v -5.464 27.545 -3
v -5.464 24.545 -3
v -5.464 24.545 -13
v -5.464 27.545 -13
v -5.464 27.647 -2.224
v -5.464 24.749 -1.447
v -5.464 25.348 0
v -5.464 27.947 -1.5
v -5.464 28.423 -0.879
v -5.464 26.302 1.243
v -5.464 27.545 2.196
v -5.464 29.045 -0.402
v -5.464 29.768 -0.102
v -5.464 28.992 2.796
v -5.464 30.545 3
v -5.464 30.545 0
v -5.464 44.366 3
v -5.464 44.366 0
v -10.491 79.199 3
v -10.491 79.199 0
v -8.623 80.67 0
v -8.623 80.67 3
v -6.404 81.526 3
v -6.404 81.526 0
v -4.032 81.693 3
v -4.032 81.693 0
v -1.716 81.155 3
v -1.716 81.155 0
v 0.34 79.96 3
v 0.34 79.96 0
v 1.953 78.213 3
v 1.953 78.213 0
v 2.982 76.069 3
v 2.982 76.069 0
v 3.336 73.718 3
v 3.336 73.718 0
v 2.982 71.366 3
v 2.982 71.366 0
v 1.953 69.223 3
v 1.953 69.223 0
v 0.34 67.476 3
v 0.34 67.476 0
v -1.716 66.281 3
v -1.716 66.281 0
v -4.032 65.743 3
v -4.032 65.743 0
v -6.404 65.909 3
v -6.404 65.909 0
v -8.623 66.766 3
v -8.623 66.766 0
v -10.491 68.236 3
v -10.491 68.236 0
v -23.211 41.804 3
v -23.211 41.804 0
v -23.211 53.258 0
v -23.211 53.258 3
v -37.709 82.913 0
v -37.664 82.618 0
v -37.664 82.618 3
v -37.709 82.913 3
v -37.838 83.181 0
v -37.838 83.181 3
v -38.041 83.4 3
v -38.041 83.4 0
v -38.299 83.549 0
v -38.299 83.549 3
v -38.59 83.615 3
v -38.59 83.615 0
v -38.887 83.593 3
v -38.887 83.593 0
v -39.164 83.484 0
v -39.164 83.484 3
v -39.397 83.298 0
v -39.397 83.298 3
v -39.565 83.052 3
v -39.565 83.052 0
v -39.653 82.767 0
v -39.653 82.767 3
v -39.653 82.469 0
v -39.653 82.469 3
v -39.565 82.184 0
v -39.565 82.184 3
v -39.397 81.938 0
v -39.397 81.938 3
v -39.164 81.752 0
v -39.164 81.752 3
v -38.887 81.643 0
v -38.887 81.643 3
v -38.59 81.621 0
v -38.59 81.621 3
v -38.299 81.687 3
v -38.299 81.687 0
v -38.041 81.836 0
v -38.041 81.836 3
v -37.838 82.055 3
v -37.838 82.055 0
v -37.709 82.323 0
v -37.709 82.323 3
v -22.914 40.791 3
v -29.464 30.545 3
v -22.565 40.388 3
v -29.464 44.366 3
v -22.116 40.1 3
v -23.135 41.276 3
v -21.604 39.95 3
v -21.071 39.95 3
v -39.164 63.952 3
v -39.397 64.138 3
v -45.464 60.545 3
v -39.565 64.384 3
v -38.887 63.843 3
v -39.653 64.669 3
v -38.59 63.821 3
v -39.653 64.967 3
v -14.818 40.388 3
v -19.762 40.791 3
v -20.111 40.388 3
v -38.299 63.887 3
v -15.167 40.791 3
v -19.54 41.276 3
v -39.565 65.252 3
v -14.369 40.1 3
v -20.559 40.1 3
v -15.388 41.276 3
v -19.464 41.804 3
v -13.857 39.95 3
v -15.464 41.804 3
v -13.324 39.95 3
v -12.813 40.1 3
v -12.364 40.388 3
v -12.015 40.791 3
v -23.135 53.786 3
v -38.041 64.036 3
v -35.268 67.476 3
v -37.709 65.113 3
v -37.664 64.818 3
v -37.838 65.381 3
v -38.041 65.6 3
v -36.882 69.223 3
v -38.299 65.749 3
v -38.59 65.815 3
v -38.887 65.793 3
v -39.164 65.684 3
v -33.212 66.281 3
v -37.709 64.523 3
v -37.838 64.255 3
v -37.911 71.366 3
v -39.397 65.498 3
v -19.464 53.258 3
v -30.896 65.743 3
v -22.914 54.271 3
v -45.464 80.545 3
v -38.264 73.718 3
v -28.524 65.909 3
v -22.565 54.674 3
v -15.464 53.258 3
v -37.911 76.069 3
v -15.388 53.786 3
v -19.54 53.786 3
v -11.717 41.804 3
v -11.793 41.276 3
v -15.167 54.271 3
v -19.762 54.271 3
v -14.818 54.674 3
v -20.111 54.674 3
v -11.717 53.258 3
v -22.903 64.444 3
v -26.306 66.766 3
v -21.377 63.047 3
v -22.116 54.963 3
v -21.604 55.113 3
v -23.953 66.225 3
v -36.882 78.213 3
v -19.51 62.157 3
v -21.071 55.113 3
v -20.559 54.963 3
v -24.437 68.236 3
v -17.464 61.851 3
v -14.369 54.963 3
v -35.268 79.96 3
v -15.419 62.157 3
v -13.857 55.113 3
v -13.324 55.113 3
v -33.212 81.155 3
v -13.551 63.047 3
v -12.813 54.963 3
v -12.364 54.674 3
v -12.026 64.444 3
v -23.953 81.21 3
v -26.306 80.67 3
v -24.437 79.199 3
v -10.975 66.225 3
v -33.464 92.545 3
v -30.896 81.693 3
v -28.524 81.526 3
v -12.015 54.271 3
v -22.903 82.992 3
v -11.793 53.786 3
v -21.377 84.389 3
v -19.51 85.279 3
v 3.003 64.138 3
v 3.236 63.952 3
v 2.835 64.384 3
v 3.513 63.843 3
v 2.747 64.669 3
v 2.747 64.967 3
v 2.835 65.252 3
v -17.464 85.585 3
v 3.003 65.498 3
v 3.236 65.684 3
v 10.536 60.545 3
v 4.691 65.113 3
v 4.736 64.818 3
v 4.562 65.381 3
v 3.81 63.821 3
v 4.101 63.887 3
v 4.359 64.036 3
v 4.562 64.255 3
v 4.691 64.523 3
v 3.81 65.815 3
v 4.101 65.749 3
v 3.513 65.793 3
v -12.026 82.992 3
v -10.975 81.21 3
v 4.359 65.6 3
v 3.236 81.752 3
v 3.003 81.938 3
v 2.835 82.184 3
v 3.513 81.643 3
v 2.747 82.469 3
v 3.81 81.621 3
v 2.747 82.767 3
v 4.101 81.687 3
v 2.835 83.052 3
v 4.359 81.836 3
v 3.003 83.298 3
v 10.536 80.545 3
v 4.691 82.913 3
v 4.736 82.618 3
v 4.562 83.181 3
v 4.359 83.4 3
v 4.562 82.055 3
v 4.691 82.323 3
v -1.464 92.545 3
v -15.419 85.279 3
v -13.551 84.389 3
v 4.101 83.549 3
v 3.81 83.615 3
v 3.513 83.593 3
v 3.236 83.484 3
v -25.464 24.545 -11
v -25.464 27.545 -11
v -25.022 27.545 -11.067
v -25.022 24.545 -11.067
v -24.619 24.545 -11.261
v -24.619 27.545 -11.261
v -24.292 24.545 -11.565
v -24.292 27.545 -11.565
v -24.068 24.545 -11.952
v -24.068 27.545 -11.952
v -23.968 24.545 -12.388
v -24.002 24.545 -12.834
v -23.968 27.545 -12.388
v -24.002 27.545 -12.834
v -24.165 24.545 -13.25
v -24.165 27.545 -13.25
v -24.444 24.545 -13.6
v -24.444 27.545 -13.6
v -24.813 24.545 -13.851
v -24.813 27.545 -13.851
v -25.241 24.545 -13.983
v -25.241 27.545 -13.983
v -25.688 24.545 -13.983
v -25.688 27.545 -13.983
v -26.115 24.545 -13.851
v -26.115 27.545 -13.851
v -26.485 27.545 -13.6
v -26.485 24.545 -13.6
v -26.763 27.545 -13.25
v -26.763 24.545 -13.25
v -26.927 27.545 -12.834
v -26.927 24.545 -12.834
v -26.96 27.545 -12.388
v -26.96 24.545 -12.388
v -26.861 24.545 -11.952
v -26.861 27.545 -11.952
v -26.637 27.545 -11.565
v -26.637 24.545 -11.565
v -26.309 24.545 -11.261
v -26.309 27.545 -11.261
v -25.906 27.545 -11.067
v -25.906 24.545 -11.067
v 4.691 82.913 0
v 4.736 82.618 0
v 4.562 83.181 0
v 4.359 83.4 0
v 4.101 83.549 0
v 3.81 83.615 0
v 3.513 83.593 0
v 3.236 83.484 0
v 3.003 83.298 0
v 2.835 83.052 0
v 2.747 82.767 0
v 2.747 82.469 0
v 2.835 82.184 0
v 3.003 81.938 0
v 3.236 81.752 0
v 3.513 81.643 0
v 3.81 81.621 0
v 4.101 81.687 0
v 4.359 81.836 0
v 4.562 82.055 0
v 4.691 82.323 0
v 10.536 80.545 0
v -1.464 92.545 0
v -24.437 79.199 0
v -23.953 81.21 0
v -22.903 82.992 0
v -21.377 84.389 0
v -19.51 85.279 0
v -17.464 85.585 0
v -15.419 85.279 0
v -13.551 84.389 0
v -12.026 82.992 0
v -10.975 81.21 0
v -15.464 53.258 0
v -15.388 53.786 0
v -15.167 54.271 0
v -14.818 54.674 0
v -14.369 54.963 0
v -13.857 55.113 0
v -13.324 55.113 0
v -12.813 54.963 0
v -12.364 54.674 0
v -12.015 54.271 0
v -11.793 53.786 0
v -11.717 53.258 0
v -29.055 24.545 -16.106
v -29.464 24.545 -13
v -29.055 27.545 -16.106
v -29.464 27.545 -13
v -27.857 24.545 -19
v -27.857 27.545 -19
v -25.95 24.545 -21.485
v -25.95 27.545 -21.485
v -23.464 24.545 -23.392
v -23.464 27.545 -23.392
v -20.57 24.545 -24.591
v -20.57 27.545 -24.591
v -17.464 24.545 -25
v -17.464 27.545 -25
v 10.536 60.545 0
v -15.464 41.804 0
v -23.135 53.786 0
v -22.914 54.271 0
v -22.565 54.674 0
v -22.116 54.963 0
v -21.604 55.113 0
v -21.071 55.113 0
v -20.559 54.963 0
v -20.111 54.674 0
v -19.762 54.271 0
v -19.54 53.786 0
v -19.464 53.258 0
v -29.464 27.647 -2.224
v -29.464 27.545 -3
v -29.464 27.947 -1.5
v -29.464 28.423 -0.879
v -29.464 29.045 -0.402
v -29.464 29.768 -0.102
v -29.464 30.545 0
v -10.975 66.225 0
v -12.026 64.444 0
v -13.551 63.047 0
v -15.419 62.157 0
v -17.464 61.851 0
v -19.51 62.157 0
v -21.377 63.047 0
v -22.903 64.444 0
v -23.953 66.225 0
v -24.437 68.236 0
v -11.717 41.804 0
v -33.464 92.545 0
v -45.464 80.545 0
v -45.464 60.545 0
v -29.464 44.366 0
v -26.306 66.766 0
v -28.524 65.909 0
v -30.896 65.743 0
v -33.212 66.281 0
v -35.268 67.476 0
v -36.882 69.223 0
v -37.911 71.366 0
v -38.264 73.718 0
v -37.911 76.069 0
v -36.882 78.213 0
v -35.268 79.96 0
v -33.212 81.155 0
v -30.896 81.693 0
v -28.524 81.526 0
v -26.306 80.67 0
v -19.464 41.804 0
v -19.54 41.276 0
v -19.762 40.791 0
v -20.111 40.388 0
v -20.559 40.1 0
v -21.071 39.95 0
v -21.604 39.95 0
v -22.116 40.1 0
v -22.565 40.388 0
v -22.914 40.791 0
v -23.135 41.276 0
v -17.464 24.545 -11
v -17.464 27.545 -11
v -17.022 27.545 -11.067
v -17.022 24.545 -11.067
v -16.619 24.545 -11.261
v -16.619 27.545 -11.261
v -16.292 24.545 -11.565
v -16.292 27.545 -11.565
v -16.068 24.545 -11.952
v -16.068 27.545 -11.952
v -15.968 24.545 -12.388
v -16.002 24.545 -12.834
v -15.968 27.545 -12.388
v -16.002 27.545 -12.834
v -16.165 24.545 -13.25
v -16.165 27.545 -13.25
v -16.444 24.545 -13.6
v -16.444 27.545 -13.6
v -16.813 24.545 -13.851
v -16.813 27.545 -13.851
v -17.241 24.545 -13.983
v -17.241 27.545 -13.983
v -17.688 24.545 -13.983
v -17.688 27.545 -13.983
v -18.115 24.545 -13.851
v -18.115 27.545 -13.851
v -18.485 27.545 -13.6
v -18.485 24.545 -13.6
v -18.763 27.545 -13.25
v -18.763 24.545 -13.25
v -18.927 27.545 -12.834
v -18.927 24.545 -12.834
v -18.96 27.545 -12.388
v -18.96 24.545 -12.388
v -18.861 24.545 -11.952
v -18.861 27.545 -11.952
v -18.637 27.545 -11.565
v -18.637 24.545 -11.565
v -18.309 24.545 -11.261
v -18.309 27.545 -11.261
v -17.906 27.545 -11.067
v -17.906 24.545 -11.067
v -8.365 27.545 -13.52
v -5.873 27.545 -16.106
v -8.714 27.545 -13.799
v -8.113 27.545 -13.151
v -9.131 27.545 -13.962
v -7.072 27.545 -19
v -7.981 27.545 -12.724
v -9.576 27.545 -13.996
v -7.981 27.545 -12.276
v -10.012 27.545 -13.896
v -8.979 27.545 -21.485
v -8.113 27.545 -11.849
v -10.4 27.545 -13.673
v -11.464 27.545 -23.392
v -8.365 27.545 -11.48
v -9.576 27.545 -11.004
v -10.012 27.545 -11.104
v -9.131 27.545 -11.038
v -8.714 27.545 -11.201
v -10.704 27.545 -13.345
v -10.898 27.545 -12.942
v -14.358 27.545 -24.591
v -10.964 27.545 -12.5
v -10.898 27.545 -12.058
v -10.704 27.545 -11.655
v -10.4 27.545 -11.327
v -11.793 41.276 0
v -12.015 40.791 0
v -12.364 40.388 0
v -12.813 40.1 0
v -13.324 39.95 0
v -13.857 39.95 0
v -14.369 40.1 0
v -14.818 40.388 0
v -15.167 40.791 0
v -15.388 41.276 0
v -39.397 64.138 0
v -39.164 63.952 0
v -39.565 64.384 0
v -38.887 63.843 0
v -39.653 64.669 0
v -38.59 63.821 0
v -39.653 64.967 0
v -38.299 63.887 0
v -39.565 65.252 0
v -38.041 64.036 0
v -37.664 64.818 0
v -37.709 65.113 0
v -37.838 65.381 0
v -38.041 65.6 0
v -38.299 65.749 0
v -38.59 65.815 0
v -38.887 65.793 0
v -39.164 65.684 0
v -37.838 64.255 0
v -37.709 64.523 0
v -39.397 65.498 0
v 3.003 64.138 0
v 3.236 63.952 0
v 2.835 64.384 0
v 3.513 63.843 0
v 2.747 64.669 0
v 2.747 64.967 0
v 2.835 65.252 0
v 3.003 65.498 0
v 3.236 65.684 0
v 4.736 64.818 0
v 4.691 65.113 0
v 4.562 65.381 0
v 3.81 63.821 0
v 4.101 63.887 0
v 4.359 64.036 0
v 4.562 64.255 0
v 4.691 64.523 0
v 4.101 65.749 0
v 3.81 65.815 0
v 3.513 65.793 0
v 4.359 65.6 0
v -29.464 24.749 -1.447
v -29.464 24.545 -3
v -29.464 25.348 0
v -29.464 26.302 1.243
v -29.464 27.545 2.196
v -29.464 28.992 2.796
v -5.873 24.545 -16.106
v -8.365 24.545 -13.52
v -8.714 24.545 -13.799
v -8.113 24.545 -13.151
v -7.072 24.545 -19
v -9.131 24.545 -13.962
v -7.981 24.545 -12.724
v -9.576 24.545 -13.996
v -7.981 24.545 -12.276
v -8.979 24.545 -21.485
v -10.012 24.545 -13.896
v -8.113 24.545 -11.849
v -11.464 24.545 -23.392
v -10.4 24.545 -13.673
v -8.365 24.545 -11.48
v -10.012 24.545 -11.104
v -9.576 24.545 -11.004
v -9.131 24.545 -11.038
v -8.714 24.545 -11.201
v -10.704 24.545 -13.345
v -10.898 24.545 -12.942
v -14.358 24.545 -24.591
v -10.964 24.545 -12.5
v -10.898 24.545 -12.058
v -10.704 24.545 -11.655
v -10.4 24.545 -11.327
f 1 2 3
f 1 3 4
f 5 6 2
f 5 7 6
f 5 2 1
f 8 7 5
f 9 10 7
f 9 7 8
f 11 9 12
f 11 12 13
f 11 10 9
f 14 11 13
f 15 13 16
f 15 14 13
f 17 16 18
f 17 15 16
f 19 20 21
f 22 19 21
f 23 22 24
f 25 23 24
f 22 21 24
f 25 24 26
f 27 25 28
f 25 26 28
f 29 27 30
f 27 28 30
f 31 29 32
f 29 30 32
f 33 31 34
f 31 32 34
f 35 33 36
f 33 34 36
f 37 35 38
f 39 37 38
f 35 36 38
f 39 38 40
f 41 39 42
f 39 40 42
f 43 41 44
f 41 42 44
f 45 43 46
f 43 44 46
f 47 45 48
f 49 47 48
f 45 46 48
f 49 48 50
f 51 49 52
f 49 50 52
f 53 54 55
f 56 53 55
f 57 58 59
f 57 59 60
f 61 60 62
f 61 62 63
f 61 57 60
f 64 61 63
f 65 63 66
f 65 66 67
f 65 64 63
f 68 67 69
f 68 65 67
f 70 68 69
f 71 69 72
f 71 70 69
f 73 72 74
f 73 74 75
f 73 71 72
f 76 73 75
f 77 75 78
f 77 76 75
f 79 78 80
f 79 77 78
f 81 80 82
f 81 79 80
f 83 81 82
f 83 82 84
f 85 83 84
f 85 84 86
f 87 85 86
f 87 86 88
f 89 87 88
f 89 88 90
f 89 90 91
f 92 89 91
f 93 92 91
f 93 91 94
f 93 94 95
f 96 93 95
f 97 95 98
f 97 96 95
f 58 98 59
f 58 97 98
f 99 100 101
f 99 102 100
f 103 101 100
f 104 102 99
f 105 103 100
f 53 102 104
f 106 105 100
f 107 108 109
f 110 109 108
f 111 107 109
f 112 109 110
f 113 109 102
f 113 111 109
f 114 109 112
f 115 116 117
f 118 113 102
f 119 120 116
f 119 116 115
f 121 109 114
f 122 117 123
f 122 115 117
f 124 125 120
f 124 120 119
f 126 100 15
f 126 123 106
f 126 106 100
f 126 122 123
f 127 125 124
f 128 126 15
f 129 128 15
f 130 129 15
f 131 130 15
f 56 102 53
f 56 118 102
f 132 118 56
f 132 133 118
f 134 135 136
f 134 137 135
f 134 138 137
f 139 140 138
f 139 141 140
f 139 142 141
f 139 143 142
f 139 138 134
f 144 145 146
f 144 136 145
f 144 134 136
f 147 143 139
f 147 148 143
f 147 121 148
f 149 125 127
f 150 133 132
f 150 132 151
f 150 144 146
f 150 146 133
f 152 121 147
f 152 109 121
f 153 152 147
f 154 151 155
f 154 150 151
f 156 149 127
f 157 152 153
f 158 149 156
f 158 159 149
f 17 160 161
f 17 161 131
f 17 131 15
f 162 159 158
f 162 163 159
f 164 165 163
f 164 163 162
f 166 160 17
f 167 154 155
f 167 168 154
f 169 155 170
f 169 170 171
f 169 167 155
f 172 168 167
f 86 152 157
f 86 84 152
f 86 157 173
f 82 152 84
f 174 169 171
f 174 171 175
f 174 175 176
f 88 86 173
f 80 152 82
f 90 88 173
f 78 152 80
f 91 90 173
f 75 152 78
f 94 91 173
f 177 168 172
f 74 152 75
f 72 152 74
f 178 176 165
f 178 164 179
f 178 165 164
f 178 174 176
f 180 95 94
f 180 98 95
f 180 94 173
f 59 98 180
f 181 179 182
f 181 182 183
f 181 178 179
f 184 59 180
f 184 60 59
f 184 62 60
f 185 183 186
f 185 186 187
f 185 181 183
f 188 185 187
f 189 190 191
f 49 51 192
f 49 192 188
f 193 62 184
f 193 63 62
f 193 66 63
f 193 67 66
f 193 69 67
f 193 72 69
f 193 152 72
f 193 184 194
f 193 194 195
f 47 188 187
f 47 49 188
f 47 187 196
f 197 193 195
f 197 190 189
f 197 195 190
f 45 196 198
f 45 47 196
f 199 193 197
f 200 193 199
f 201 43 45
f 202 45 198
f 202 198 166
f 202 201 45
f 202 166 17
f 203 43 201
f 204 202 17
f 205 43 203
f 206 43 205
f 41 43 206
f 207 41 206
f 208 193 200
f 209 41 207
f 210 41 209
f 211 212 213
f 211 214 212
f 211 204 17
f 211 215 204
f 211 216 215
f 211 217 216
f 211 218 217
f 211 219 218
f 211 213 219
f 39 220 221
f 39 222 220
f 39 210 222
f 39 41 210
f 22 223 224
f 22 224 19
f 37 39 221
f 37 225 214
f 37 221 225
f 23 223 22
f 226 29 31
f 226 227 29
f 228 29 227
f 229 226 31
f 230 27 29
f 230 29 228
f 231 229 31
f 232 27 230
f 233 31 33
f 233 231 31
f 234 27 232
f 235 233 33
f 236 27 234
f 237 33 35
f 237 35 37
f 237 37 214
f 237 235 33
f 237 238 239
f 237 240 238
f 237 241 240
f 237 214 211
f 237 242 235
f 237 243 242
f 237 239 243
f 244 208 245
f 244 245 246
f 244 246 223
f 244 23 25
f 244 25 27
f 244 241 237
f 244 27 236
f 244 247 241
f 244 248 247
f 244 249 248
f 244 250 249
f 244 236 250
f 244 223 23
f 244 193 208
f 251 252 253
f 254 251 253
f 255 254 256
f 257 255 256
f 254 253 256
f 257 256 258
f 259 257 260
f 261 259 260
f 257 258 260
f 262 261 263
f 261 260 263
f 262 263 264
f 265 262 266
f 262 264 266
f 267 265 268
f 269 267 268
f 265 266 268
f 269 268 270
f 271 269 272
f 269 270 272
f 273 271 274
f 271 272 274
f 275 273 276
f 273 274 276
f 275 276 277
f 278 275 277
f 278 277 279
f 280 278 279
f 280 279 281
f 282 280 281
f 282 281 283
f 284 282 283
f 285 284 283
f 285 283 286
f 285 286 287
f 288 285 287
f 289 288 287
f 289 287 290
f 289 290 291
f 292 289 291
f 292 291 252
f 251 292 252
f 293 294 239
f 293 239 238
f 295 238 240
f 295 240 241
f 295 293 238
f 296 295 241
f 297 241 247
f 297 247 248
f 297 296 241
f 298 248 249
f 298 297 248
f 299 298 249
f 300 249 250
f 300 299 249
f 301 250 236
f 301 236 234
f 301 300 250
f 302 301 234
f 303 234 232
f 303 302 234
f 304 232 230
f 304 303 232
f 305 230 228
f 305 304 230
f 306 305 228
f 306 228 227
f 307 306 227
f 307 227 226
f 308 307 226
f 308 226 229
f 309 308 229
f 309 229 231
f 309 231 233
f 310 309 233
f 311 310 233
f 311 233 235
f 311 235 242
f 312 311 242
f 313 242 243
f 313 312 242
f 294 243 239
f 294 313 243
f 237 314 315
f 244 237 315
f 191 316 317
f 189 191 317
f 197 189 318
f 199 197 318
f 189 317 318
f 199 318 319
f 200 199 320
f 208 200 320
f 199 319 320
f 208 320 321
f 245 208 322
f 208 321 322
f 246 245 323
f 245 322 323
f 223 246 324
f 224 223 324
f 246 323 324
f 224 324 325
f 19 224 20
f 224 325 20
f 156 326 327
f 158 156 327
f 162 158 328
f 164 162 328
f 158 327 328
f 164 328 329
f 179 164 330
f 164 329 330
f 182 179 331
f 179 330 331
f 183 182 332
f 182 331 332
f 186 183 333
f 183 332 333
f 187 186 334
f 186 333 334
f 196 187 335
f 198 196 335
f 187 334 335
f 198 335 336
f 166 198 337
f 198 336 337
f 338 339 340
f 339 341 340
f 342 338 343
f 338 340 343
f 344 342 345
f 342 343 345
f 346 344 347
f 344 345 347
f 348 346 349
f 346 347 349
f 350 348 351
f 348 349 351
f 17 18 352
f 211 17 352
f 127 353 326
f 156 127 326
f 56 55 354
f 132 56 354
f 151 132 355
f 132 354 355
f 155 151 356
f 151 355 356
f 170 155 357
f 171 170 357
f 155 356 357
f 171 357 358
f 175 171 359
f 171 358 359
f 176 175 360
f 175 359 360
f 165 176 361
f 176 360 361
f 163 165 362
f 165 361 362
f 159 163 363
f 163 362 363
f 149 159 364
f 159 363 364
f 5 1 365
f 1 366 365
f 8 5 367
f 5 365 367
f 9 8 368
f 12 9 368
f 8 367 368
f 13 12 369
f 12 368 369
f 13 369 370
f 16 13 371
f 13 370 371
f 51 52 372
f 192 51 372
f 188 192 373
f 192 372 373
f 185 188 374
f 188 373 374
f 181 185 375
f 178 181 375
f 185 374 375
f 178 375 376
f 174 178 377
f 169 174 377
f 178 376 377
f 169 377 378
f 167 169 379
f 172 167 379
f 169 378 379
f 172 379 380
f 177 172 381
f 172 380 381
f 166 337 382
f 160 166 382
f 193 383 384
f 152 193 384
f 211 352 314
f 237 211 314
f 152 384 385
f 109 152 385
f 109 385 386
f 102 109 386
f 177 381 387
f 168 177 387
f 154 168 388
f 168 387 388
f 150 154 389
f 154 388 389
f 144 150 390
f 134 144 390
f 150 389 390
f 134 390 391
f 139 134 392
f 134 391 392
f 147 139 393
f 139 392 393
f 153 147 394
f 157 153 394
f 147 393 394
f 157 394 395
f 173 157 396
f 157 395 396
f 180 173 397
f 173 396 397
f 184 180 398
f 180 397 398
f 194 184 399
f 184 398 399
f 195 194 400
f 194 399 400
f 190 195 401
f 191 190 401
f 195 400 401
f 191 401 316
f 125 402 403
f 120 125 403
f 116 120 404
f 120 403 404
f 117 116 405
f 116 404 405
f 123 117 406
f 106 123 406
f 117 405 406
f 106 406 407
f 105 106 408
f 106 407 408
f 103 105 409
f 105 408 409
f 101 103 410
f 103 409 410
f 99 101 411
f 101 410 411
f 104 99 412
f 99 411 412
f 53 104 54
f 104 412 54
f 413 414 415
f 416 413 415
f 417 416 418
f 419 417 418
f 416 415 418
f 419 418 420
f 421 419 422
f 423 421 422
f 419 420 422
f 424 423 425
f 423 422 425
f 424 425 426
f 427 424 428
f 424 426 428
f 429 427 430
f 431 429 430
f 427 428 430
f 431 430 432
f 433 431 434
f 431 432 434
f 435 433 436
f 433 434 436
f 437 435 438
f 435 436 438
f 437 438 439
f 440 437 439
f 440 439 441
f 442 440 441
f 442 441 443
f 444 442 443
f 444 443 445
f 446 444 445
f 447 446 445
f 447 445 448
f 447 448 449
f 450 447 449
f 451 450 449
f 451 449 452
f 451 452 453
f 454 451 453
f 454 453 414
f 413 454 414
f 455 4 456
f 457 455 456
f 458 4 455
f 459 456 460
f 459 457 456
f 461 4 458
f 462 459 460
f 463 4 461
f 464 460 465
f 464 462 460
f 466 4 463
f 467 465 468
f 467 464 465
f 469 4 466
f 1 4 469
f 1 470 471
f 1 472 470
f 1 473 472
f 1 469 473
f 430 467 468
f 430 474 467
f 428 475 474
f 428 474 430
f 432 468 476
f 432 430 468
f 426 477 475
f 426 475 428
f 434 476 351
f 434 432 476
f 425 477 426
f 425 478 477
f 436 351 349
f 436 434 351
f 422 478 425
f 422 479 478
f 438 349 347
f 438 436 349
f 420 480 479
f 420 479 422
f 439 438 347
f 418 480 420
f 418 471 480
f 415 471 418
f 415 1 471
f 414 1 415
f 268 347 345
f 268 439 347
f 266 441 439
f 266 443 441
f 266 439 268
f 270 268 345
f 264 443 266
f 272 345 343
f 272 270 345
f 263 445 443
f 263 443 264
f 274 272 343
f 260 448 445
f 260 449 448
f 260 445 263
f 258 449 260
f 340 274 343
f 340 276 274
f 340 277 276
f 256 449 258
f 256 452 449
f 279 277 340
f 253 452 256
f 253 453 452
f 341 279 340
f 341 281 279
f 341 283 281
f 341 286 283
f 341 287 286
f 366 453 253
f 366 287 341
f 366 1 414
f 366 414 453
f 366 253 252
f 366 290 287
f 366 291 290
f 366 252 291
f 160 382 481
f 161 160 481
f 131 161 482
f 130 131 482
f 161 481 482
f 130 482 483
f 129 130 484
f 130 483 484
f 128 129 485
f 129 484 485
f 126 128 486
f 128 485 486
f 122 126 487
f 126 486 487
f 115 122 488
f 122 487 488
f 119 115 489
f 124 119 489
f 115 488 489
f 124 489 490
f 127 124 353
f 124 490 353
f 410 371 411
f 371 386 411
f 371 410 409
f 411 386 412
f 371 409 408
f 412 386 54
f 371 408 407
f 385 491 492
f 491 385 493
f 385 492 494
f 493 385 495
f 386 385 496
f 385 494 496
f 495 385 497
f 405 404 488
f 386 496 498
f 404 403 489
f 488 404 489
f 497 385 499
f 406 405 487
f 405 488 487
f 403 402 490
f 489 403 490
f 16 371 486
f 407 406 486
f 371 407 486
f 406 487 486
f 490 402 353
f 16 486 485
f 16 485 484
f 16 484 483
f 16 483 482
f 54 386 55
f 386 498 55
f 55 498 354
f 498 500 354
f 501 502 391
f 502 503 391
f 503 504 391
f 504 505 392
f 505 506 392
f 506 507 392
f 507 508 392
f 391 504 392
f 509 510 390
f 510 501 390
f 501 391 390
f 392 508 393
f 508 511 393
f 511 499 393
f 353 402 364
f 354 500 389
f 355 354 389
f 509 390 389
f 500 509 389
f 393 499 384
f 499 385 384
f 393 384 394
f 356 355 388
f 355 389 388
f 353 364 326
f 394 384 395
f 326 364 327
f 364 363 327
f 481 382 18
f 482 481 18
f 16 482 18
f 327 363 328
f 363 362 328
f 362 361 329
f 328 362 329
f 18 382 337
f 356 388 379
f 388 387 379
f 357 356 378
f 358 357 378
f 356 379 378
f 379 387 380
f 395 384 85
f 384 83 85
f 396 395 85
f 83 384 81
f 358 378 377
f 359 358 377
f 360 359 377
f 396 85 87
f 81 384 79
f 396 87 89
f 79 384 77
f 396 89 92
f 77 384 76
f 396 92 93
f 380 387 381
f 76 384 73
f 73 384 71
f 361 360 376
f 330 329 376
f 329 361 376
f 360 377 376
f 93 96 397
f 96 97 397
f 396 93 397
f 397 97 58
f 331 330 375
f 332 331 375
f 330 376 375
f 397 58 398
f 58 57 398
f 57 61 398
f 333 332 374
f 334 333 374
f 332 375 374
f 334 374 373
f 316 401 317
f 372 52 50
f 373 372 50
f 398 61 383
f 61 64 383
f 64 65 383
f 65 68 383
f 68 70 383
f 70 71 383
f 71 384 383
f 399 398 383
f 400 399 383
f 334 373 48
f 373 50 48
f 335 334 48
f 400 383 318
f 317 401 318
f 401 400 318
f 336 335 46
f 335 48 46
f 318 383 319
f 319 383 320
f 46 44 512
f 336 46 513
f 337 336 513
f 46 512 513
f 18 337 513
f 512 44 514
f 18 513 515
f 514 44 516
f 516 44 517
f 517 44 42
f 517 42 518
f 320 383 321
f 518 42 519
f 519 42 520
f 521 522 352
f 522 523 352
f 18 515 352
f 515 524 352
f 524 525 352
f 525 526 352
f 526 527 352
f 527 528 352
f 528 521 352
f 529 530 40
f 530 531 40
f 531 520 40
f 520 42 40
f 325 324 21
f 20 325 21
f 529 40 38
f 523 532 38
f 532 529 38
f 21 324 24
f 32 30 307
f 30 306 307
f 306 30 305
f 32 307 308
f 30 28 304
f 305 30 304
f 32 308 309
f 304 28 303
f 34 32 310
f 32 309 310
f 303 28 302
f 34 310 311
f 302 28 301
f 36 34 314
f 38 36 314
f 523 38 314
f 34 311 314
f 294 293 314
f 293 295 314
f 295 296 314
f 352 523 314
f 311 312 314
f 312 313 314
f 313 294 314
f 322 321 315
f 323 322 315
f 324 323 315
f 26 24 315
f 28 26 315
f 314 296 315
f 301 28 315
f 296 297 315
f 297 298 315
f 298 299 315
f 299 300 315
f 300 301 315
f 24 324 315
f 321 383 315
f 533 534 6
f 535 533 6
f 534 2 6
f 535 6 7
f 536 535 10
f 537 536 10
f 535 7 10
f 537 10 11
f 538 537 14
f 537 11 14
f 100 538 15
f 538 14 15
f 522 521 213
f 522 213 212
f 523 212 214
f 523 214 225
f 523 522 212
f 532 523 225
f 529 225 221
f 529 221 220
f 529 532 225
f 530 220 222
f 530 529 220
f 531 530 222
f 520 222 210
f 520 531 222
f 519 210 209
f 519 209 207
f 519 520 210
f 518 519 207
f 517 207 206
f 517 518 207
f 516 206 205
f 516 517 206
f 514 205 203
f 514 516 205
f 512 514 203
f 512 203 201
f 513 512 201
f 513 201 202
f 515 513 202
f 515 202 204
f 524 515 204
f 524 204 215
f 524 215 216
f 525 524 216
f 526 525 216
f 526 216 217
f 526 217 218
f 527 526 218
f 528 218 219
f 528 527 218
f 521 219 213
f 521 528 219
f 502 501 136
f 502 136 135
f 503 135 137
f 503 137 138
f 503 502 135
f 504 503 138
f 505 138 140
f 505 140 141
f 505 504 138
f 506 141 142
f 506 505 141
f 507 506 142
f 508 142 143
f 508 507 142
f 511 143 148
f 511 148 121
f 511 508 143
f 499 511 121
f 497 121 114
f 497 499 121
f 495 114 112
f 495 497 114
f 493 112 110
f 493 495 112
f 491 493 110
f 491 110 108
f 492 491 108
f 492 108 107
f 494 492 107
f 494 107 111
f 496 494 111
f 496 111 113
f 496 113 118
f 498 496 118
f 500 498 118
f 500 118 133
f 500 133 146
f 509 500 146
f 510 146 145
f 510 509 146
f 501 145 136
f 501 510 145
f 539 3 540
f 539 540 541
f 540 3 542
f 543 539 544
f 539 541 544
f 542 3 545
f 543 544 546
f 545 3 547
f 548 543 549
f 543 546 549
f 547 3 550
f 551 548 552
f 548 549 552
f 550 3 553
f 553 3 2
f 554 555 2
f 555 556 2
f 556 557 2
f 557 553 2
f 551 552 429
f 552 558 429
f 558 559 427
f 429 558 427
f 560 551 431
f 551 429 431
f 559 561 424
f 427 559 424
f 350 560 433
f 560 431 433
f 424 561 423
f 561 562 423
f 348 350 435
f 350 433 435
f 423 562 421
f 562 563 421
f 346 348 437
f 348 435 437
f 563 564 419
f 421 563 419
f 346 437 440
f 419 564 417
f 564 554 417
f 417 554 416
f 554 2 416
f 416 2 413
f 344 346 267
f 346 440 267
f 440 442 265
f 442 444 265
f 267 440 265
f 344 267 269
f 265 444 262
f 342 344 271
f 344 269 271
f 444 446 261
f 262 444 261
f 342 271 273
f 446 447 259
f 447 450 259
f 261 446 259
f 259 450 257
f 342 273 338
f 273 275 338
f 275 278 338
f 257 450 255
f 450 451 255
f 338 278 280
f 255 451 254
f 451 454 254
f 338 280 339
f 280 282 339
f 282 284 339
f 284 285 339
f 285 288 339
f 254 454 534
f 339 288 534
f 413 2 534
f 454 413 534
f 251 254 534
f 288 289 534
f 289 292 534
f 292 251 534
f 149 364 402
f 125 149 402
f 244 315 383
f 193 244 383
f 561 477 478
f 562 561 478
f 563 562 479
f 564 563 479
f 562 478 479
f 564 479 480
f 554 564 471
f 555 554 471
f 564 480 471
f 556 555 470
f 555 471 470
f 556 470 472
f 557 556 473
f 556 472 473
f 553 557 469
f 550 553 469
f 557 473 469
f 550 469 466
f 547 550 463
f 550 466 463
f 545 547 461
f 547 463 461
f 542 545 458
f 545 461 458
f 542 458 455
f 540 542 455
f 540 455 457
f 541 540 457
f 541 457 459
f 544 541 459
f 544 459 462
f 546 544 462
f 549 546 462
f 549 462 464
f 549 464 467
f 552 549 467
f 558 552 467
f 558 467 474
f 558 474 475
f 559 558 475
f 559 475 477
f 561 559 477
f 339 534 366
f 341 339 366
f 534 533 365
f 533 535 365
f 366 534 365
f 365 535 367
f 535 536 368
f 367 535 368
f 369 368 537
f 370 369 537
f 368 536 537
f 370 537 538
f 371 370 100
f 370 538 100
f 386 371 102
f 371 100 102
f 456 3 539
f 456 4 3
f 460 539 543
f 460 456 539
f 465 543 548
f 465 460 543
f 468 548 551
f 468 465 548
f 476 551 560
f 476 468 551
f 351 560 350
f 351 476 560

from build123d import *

# Parameters (mm, degrees)
SKETCH1_R           = 1
BOSS_EXTRUDE1_DEPTH = 3
SKETCH2_W           = 24
SKETCH2_H           = 3
BOSS_EXTRUDE2_DEPTH = 25
FILLET3_R           = 12
SKETCH3_R           = 1.5
CUT_EXTRUDE1_DEPTH  = 25
FILLET5_R           = 3
FILLET6_R           = 6


with BuildPart() as part:
    # Sketch1 → Boss-Extrude1 (new body)
    with BuildSketch(Plane.XY):
        Polygon((-5.464285714, 44.366071429), (10.535714286, 60.544642857), (10.535714286, 80.544642857), (-1.464285714, 92.544642857), (-33.464285714, 92.544642857), (-45.464285714, 80.544642857), (-45.464285714, 60.544642857), (-29.464285714, 44.366071429), (-29.464285714, 24.544642857), (-5.464285714, 24.544642857), align=None)
        with BuildLine():
            Line((-23.211141689, 41.803891012), (-23.211141689, 53.258480522))
            ThreePointArc((-23.211141689, 53.258480522), (-21.337713702, 55.131908509), (-19.464285714, 53.258480522))
            Line((-19.464285714, 53.258480522), (-19.464285714, 41.803891012))
            ThreePointArc((-19.464285714, 41.803891012), (-21.337713702, 39.930463025), (-23.211141689, 41.803891012))
        make_face(mode=Mode.SUBTRACT)
        with BuildLine():
            ThreePointArc((-15.464285714, 53.258480522), (-13.590857727, 55.131908509), (-11.71742974, 53.258480522))
            Line((-11.71742974, 53.258480522), (-11.71742974, 41.803891012))
            ThreePointArc((-11.71742974, 41.803891012), (-13.590857727, 39.930463025), (-15.464285714, 41.803891012))
            Line((-15.464285714, 41.803891012), (-15.464285714, 53.258480522))
        make_face(mode=Mode.SUBTRACT)
        with Locations((-38.664285714, 64.817850901)):
            Circle(SKETCH1_R, mode=Mode.SUBTRACT)
        with BuildLine():
            ThreePointArc((-24.437255613, 79.199248551), (-17.464285714, 85.584683016), (-10.491315816, 79.199248551))
            ThreePointArc((-10.491315816, 79.199248551), (3.335714286, 73.717850901), (-10.491315816, 68.236453251))
            ThreePointArc((-10.491315816, 68.236453251), (-17.464285714, 61.851018785), (-24.437255613, 68.236453251))
            ThreePointArc((-24.437255613, 68.236453251), (-38.264285714, 73.717850901), (-24.437255613, 79.199248551))
        make_face(mode=Mode.SUBTRACT)
        with Locations((-38.664285714, 82.617850901)):
            Circle(SKETCH1_R, mode=Mode.SUBTRACT)
        with Locations((3.735714286, 64.817850901)):
            Circle(SKETCH1_R, mode=Mode.SUBTRACT)
        with Locations((3.735714286, 82.617850901)):
            Circle(SKETCH1_R, mode=Mode.SUBTRACT)
    extrude(amount=BOSS_EXTRUDE1_DEPTH)

    # Sketch2 → Boss-Extrude2 (add)
    with BuildSketch(Plane(origin=(0, 0, 0), x_dir=(-1, 0, 0), z_dir=(0, 0, -1))):
        with Locations((17.464285714, 26.044642857)):
            Rectangle(SKETCH2_W, SKETCH2_H)
    extrude(amount=BOSS_EXTRUDE2_DEPTH)

    # Fillet3
    fillet3_edges = [part.edges().sort_by_distance(p)[0] for p in [
        (-29.464285714, 26.044642857, -25),
        (-5.464285714, 26.044642857, -25),
    ]]
    fillet(fillet3_edges, radius=FILLET3_R - 0.0001)  # a hair under: the kernel refuses the full size

    # Sketch3 → Cut-Extrude1 (cut)
    with BuildSketch(Plane(origin=(0, 27.544642857, 0), x_dir=(1, 0, 0), z_dir=(0, 1, 0))):
        with Locations(Location((-17.464285714, 12.5, 0), (0, 0, 270))):
            Circle(SKETCH3_R)
        with Locations(Location((-25.464285714, 12.5, 0), (0, 0, 270))):
            Circle(SKETCH3_R)
        with Locations(Location((-9.464285714, 12.5, 0), (0, 0, 180))):
            Circle(SKETCH3_R)
    extrude(amount=-CUT_EXTRUDE1_DEPTH, mode=Mode.SUBTRACT)

    # Fillet5
    fillet5_edges = [part.edges().sort_by_distance(p)[0] for p in [
        (-17.464285714, 27.544642857, 0),
    ]]
    fillet(fillet5_edges, radius=FILLET5_R)

    # Fillet6
    fillet6_edges = [part.edges().sort_by_distance(p)[0] for p in [
        (-17.464285714, 24.544642857, 3),
    ]]
    fillet(fillet6_edges, radius=FILLET6_R)


solid = part.part
